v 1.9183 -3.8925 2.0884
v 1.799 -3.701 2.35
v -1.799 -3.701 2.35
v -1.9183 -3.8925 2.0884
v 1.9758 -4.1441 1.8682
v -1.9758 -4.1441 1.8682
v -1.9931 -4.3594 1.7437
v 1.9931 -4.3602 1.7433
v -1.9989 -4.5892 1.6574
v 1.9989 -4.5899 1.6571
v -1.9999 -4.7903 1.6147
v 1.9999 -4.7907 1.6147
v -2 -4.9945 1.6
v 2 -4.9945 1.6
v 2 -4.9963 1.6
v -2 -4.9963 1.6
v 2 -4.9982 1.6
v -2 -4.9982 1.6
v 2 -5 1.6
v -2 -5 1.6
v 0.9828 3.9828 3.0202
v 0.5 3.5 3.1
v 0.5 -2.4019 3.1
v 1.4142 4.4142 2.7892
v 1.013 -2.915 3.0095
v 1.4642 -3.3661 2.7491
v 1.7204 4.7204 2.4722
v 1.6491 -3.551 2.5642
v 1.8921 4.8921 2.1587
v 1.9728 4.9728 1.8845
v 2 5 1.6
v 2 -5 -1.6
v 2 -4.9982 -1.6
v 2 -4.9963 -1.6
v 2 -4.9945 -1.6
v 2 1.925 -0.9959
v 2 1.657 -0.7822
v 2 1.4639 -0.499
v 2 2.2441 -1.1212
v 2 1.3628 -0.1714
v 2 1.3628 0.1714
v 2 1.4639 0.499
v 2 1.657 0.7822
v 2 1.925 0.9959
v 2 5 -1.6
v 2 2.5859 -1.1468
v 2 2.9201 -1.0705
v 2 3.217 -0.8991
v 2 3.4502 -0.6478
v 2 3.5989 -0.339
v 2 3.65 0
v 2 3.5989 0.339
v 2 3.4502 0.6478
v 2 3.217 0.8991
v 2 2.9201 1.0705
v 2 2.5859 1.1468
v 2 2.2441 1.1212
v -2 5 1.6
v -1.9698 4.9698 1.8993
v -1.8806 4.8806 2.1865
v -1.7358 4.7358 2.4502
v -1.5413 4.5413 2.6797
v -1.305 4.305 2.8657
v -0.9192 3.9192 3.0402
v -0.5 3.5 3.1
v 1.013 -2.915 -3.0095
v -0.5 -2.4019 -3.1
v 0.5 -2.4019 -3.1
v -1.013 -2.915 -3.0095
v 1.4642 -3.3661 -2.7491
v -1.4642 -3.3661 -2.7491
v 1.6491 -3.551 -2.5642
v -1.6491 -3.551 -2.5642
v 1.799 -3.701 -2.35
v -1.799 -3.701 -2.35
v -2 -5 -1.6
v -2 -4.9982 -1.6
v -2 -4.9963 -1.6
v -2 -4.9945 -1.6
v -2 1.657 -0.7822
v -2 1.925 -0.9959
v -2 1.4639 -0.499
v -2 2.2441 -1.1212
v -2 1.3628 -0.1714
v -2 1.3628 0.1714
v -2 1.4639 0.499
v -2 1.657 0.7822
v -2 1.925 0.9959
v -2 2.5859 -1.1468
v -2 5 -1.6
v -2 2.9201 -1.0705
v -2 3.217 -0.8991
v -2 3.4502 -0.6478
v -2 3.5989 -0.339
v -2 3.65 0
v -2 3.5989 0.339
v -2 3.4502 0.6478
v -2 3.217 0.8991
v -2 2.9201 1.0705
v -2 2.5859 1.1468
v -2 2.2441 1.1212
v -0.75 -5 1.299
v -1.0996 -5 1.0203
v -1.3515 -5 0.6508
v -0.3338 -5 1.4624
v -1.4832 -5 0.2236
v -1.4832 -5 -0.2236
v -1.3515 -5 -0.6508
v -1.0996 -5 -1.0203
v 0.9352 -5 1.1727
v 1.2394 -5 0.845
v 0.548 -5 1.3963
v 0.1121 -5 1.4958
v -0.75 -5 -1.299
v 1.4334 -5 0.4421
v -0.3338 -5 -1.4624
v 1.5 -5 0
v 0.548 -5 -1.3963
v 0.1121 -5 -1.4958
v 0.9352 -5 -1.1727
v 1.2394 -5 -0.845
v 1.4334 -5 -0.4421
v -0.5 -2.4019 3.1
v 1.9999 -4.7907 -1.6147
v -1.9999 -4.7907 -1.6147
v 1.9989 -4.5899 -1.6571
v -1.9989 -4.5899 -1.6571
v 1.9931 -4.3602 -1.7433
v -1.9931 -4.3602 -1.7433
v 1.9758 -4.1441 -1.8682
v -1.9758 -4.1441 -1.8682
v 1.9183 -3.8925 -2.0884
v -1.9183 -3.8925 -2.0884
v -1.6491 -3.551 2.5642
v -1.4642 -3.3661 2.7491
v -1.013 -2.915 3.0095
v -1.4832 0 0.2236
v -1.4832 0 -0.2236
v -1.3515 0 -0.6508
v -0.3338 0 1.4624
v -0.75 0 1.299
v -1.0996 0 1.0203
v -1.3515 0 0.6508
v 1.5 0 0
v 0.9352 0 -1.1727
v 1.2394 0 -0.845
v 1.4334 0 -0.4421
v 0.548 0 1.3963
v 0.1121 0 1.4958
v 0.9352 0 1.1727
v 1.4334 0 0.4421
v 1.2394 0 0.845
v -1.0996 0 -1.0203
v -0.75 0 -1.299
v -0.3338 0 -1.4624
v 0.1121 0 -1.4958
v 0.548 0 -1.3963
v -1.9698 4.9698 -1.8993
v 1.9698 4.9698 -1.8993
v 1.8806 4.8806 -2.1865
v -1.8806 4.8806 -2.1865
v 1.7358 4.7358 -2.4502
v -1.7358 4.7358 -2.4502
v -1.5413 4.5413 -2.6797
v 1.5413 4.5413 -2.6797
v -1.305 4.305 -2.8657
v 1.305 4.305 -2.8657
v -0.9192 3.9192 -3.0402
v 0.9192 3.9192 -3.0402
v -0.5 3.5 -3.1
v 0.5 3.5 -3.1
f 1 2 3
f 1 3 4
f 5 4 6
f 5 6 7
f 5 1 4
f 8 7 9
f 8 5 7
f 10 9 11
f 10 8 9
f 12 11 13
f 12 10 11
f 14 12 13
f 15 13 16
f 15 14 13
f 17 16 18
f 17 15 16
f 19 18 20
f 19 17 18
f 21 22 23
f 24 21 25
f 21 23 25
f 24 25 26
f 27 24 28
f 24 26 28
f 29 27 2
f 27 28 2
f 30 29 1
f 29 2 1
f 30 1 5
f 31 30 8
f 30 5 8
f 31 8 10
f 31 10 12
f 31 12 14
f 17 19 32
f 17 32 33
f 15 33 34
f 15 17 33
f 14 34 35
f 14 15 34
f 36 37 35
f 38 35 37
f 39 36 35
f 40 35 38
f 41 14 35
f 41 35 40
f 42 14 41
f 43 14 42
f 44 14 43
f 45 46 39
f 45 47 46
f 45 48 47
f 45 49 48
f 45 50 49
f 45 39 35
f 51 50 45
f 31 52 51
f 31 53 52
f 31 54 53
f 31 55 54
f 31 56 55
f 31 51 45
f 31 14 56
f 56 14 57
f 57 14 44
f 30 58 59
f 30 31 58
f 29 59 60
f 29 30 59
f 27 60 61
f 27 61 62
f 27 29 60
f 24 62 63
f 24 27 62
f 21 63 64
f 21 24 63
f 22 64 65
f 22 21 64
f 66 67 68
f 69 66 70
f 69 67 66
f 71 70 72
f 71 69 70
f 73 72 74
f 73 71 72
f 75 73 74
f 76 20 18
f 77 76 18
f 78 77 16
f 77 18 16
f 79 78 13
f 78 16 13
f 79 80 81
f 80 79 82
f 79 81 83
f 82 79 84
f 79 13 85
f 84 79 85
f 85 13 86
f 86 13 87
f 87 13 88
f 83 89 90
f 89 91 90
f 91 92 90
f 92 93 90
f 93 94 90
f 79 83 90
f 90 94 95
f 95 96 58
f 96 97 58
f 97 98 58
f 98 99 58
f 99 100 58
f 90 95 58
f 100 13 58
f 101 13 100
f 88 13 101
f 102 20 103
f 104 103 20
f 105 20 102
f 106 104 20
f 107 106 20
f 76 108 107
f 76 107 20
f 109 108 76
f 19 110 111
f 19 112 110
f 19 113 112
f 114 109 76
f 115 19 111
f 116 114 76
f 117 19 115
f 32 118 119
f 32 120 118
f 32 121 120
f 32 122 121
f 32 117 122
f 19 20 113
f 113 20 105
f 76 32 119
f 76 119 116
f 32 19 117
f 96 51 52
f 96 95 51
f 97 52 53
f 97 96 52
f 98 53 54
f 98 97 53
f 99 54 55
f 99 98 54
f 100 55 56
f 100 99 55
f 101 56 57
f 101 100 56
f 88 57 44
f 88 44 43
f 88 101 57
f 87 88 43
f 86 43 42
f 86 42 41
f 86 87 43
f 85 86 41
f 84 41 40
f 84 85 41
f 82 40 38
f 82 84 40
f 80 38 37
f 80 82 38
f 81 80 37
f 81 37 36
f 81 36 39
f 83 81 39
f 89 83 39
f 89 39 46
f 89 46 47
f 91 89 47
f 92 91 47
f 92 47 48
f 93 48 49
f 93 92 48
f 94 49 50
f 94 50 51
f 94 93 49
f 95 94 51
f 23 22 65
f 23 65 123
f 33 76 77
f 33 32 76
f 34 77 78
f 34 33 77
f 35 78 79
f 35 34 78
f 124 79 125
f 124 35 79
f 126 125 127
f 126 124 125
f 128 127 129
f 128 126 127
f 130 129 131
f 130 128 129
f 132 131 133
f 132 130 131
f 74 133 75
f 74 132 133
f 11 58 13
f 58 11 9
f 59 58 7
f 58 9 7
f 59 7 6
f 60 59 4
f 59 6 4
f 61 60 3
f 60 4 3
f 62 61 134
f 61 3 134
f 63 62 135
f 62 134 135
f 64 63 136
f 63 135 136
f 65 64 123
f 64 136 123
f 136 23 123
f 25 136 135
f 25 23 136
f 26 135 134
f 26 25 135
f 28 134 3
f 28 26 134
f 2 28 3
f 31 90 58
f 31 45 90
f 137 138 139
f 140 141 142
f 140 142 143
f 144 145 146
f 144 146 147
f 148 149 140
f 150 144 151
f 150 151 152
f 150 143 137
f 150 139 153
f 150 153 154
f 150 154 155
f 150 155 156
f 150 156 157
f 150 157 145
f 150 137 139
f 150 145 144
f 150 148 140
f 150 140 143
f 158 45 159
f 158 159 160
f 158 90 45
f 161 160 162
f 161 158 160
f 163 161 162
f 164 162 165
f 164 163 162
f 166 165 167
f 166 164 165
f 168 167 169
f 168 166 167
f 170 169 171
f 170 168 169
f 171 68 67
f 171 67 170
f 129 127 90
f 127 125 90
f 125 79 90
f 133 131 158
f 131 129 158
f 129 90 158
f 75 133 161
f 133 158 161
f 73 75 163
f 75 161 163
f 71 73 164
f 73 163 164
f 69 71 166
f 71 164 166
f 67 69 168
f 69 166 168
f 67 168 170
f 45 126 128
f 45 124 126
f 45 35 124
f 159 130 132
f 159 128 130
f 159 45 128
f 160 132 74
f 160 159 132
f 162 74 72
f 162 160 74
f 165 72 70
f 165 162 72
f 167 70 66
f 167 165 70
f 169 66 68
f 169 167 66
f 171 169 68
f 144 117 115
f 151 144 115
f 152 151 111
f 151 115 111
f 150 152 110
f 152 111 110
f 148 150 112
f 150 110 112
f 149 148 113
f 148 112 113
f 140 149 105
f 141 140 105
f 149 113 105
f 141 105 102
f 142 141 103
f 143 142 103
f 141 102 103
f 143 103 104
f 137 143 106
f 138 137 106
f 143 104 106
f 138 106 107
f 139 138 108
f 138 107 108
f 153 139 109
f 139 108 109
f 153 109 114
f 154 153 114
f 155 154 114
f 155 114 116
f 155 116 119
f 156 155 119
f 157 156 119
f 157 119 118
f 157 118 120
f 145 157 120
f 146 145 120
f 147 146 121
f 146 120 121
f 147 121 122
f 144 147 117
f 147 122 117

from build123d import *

# Parameters (mm, degrees)
F0_R     = 1.15
F1_DEPTH = 2
F2_R     = 1.5
F3_DEPTH = 5
F4_R     = 1.49999


# Not quite as in the source:
# - a fillet or chamfer is up to 0.001 mm smaller than in the source, because OpenCascade refuses the exact size


with BuildPart() as f1:
    # F0 (on Right) → F1 (new body, symmetric)
    with BuildSketch(Plane.YZ):
        with BuildLine():
            Line((5, -3.1), (5, 3.1))
            Line((5, 3.1), (-3.5, 3.1))
            ThreePointArc((-3.5, 3.1), (-3.9393398282, 2.0393398282), (-5, 1.6))
            Line((-5, 1.6), (-5, -1.6))
            ThreePointArc((-5, -1.6), (-3.9393398282, -2.0393398282), (-3.5, -3.1))
            Line((-3.5, -3.1), (5, -3.1))
        make_face()
        with Locations((2.5, 0)):
            Circle(F0_R, mode=Mode.SUBTRACT)
    extrude(amount=F1_DEPTH, both=True)

    # F2 (on face) → F3 (cut)
    with BuildSketch(Plane.XZ.offset(5)):
        Circle(F2_R)
    extrude(amount=-F3_DEPTH, mode=Mode.SUBTRACT)

    # F4 (radius 1.5 in the source; OpenCascade refuses exactly that, so slightly less here)
    f4_edges = [f1.edges().sort_by_distance(p)[0] for p in [
        (0, -3.5, 3.1),
        (0, -3.5, -3.1),
        (2, 0.75, -3.1),
        (2, 0.75, 3.1),
        (0, 5, 3.1),
        (0, 5, -3.1),
        (-2, 0.75, 3.1),
        (-2, 0.75, -3.1),
    ]]
    fillet(f4_edges, radius=F4_R)


solid = f1.part
